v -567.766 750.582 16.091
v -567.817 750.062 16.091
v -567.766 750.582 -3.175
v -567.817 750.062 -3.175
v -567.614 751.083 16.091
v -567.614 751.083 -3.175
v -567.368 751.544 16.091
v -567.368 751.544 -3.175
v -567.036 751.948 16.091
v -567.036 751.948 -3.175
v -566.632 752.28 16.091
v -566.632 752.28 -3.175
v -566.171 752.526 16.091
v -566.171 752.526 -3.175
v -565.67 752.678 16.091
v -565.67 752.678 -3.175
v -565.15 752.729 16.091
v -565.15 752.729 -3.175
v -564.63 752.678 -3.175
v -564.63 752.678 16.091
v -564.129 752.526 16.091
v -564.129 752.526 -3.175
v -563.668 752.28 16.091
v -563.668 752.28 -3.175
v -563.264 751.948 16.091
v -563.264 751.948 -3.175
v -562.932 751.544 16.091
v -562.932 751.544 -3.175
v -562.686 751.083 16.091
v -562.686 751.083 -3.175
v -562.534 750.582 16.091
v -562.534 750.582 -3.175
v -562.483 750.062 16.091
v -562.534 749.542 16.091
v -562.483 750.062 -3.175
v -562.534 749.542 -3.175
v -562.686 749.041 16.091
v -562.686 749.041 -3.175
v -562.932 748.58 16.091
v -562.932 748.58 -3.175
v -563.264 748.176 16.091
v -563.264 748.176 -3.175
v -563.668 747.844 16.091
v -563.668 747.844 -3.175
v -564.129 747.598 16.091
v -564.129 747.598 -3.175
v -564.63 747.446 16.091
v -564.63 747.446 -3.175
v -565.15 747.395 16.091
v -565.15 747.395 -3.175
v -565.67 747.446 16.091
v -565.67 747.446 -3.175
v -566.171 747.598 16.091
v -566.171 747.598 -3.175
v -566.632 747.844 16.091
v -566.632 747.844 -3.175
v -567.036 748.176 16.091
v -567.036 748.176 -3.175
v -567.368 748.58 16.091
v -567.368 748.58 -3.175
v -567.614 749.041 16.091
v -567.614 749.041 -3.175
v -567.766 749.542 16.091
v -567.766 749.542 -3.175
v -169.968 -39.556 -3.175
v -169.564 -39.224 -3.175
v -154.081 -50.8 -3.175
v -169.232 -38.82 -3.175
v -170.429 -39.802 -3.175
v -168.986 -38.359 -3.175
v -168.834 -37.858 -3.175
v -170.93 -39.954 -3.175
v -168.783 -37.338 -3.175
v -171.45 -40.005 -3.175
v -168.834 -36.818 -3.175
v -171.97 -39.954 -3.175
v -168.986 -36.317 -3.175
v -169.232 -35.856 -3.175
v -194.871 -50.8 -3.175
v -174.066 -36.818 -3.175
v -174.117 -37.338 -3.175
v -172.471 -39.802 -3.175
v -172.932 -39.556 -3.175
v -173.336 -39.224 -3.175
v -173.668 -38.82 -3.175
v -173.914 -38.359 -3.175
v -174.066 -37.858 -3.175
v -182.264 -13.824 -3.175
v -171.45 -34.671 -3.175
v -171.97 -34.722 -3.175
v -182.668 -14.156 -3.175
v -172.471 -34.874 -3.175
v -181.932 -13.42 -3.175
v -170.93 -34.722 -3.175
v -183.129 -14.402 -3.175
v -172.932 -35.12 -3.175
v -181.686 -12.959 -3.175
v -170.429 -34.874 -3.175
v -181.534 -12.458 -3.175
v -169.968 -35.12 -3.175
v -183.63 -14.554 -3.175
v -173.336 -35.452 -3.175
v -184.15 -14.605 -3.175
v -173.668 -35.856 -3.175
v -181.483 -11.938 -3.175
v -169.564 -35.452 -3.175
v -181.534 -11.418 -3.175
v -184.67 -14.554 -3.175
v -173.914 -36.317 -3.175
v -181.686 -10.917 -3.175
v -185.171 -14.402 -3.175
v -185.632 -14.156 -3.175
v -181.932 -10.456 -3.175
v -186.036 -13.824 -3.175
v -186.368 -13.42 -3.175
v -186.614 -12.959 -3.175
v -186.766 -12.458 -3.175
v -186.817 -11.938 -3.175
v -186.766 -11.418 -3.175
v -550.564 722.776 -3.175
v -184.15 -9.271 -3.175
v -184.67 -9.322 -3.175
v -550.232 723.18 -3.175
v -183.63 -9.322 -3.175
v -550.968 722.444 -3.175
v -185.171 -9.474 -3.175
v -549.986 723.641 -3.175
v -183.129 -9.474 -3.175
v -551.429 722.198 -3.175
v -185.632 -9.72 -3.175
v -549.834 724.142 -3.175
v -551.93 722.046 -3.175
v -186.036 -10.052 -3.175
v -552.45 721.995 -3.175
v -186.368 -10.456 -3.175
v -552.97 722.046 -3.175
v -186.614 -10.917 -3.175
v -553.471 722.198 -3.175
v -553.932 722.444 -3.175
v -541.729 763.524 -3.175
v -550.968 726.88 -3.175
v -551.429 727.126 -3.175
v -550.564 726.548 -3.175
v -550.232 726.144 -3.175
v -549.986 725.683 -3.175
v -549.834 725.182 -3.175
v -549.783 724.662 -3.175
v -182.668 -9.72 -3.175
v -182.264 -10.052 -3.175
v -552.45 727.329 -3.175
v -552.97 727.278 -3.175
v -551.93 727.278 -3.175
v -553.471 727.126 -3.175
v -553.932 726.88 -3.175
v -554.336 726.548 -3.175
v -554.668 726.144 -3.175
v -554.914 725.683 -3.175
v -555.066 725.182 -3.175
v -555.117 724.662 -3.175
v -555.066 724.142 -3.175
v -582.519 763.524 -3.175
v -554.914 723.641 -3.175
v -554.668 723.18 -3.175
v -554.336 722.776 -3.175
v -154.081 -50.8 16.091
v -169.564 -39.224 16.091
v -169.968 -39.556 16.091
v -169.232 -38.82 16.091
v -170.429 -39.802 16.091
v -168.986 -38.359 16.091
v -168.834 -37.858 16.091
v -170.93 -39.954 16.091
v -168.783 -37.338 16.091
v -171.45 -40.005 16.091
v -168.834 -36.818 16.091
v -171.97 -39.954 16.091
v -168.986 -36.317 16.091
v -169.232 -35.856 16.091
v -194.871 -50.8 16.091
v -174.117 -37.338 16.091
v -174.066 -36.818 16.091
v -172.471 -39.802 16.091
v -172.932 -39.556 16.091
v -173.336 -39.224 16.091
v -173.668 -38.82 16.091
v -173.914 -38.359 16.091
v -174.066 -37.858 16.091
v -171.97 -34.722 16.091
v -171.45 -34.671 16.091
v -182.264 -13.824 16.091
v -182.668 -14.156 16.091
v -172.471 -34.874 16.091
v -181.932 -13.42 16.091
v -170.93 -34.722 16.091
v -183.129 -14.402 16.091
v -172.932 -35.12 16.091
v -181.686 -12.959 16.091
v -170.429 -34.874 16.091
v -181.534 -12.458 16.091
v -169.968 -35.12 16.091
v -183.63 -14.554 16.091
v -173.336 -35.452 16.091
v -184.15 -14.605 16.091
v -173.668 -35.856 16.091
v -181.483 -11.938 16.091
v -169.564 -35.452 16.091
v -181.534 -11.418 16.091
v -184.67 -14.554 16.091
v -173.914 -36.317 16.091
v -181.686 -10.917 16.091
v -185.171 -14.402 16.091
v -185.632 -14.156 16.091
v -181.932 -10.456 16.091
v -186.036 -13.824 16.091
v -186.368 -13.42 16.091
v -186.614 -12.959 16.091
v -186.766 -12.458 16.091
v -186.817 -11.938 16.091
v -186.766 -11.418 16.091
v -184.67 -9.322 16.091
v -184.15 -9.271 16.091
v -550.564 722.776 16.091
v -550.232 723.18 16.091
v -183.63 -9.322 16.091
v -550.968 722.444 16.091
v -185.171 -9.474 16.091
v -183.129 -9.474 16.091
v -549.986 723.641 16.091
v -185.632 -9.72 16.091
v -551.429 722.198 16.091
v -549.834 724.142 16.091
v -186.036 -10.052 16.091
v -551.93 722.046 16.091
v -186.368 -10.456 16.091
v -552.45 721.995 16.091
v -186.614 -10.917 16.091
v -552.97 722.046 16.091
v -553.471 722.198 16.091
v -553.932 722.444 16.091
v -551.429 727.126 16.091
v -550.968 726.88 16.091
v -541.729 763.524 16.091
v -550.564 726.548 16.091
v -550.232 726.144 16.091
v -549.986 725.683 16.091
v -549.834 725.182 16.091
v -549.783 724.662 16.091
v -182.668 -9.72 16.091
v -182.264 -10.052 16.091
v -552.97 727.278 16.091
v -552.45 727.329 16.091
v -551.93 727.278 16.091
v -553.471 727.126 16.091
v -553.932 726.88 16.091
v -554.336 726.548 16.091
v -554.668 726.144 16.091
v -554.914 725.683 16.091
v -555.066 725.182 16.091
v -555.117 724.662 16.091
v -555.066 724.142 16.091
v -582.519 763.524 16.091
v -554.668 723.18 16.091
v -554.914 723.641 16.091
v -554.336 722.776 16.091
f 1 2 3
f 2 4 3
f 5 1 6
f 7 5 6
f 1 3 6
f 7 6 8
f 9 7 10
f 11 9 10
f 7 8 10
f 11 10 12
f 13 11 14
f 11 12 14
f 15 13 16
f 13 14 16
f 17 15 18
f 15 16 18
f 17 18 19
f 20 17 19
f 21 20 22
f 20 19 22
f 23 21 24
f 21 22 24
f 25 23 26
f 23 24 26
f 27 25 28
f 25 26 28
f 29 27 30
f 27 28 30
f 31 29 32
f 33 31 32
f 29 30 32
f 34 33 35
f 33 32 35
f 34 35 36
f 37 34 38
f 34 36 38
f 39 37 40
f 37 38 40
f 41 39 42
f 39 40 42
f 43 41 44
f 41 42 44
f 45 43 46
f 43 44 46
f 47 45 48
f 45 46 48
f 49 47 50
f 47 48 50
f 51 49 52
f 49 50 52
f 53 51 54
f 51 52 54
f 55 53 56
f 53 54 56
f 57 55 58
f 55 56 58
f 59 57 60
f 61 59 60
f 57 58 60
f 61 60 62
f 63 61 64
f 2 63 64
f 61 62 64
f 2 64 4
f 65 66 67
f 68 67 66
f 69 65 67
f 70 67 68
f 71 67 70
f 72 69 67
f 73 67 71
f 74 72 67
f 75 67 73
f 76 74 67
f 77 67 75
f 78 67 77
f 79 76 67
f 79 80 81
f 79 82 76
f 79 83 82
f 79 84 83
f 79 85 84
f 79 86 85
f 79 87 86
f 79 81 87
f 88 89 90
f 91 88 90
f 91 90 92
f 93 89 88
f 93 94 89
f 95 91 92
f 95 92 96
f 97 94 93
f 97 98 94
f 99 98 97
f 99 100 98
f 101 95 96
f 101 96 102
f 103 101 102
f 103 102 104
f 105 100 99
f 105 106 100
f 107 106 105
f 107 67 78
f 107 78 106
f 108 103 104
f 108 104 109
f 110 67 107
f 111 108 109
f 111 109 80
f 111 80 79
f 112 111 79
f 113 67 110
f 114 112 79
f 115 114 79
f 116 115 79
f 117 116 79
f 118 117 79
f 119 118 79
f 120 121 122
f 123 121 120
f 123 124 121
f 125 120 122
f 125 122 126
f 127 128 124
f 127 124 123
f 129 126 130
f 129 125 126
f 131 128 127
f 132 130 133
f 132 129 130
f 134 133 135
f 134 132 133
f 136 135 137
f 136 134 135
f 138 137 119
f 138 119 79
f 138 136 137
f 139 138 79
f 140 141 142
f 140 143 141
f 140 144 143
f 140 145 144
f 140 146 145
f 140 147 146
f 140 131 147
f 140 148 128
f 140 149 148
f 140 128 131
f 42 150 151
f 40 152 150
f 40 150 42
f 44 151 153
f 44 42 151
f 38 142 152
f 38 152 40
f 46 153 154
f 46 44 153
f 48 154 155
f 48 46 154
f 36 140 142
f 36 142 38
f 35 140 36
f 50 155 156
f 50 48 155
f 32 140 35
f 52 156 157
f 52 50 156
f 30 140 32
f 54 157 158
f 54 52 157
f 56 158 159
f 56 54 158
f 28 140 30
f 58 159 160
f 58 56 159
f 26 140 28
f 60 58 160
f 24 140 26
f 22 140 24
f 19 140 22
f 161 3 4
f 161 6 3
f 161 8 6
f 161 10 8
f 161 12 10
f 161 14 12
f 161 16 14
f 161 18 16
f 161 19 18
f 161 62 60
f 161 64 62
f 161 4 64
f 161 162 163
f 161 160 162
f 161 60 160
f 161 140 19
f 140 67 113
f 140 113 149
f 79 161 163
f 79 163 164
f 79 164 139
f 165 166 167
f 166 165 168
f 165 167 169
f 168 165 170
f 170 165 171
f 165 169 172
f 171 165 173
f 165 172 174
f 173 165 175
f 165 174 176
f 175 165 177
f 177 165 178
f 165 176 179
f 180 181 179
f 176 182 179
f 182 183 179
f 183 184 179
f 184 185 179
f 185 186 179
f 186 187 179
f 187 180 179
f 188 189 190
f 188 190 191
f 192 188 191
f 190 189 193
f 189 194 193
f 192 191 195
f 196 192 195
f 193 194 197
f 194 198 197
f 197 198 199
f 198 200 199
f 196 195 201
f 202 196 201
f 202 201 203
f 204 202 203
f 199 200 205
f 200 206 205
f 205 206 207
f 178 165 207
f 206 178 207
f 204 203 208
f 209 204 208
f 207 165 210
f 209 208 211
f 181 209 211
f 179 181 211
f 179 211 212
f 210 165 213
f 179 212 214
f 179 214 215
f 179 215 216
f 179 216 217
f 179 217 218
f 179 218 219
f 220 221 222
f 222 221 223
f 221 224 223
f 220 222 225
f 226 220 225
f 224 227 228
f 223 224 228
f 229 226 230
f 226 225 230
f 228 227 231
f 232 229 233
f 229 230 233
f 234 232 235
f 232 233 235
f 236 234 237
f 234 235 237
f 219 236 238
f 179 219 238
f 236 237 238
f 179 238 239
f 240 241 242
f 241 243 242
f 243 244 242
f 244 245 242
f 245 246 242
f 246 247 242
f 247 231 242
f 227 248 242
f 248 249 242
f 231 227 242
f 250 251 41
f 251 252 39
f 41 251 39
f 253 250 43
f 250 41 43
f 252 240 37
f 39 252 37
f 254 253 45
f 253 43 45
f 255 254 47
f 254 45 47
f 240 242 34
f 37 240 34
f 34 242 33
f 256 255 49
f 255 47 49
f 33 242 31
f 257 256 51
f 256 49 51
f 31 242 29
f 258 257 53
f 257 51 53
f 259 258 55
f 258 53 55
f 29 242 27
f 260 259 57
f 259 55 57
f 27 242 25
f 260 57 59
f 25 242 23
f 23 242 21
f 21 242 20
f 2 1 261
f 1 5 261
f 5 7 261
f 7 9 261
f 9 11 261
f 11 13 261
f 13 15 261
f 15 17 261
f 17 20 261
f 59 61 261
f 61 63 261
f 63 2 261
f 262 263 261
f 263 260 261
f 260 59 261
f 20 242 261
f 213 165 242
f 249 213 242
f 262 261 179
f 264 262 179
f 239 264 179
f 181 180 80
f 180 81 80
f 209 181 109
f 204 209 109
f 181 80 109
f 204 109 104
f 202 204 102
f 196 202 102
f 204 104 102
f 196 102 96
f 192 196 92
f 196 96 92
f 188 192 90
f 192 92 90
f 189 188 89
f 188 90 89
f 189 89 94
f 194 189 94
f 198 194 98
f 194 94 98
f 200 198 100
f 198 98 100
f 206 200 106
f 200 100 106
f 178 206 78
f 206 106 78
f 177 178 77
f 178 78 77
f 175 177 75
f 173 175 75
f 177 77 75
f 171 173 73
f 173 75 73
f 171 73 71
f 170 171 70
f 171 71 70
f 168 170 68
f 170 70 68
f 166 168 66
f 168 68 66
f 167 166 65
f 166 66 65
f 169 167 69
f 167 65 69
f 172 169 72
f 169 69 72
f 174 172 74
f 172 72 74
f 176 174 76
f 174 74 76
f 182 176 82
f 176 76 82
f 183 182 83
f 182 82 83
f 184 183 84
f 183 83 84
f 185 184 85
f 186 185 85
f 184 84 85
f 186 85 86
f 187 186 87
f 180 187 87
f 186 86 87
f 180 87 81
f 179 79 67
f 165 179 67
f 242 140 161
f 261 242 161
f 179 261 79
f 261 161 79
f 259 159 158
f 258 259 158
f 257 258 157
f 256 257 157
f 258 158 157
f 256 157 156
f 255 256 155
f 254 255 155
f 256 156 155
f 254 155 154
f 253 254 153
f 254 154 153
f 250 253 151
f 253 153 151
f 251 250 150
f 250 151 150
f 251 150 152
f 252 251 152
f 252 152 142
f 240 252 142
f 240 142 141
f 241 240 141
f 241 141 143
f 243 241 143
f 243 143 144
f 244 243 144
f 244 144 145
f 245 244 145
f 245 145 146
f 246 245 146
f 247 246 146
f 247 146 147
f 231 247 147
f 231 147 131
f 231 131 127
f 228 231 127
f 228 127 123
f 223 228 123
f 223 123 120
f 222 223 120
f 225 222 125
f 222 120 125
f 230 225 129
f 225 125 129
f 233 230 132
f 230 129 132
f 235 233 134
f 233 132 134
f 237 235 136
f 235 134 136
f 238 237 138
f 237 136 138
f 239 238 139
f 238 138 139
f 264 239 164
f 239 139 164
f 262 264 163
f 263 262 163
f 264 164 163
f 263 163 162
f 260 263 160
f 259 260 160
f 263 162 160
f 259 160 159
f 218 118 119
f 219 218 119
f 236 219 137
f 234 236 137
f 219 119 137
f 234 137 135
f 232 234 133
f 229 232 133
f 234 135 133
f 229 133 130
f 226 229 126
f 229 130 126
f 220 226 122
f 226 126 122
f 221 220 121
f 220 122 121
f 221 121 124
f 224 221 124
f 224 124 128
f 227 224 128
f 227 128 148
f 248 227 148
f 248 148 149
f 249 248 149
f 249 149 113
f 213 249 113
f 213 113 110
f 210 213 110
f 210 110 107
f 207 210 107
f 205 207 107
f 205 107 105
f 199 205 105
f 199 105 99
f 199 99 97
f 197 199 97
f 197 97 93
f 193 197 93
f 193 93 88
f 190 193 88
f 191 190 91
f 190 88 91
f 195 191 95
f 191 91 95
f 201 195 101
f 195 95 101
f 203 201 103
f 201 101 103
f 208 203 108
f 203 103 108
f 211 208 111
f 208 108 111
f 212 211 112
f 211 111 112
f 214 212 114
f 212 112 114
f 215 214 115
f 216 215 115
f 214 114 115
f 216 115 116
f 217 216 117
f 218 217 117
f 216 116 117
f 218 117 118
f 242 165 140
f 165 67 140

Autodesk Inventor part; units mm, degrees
ref_plane "YZ Plane" through (0, 0, 0) normal (1, 0, 0) x (0, 1, 0)
ref_plane "XZ Plane" through (0, 0, 0) normal (0, 1, 0) x (-1, 0, 0)
ref_plane "XY Plane" through (0, 0, 0) normal (0, 0, 1) x (1, 0, 0)
ref_plane "Work Plane1" through (0, 0, -3.175) normal (0, 0, -1) x (-1, 0, 0)
sketch "Sketch1" plane through (0, 0, -3.175) normal (0, 0, -1) x (-1, 0, 0)
  circle A0 centre (171.45, -37.338) radius 2.667 projected
  circle A1 centre (184.15, -11.938) radius 2.667 projected
  circle A2 centre (577.85, 750.062) radius 2.667 construction
  circle A3 centre (565.15, 724.662) radius 2.667 construction
  line L0 (0, 763.524) -> (736.6, 763.524) projected
  line L1 (736.6, -50.8) -> (0, -50.8) projected
  line L2 (154.0806, -50.8) -> (541.7292, 763.524)
  line L3 (582.5194, 763.524) -> (194.8708, -50.8)
  line L4 (194.8708, -50.8) -> (154.0806, -50.8)
  line L5 (541.7292, 763.524) -> (582.5194, 763.524)
  line L6 (487.8257, 564.3774) -> (487.8257, 502.6234) construction
  line L7 (594.2009, 565.5044) -> (496.0553, 565.5044) construction
  line L8 (488.8257, 565.3774) -> (496.0553, 565.3774) construction
  line L9 (248.7743, 148.3466) -> (248.7743, 210.1006) construction
  line L10 (247.7743, 147.3466) -> (240.5447, 147.3466) construction
  line L11 (142.3991, 147.2196) -> (240.5447, 147.2196) construction
  arc A4 (247.7743, 147.3466) -> (248.7743, 148.3466) centre (247.7743, 148.3466) ccw construction
  arc A5 (488.8257, 565.3774) -> (487.8257, 564.3774) centre (488.8257, 564.3774) ccw construction
  line L12 (622.3, 759.587) -> (622.3, 435.737) construction
  line L13 (114.3, -46.863) -> (114.3, 276.987) construction
  circle A6 centre (565.15, 750.062) radius 2.667 projected
  circle A7 centre (552.45, 724.662) radius 2.667 projected
  point P0 (0, 0)
  dimension "d0" = 36.83
  dimension "d1" = 39.7806
extrude "Extrusion1" add sketch "Sketch1" against normal blind 19.2659
properties part number "FR-RL Wood Brace"
